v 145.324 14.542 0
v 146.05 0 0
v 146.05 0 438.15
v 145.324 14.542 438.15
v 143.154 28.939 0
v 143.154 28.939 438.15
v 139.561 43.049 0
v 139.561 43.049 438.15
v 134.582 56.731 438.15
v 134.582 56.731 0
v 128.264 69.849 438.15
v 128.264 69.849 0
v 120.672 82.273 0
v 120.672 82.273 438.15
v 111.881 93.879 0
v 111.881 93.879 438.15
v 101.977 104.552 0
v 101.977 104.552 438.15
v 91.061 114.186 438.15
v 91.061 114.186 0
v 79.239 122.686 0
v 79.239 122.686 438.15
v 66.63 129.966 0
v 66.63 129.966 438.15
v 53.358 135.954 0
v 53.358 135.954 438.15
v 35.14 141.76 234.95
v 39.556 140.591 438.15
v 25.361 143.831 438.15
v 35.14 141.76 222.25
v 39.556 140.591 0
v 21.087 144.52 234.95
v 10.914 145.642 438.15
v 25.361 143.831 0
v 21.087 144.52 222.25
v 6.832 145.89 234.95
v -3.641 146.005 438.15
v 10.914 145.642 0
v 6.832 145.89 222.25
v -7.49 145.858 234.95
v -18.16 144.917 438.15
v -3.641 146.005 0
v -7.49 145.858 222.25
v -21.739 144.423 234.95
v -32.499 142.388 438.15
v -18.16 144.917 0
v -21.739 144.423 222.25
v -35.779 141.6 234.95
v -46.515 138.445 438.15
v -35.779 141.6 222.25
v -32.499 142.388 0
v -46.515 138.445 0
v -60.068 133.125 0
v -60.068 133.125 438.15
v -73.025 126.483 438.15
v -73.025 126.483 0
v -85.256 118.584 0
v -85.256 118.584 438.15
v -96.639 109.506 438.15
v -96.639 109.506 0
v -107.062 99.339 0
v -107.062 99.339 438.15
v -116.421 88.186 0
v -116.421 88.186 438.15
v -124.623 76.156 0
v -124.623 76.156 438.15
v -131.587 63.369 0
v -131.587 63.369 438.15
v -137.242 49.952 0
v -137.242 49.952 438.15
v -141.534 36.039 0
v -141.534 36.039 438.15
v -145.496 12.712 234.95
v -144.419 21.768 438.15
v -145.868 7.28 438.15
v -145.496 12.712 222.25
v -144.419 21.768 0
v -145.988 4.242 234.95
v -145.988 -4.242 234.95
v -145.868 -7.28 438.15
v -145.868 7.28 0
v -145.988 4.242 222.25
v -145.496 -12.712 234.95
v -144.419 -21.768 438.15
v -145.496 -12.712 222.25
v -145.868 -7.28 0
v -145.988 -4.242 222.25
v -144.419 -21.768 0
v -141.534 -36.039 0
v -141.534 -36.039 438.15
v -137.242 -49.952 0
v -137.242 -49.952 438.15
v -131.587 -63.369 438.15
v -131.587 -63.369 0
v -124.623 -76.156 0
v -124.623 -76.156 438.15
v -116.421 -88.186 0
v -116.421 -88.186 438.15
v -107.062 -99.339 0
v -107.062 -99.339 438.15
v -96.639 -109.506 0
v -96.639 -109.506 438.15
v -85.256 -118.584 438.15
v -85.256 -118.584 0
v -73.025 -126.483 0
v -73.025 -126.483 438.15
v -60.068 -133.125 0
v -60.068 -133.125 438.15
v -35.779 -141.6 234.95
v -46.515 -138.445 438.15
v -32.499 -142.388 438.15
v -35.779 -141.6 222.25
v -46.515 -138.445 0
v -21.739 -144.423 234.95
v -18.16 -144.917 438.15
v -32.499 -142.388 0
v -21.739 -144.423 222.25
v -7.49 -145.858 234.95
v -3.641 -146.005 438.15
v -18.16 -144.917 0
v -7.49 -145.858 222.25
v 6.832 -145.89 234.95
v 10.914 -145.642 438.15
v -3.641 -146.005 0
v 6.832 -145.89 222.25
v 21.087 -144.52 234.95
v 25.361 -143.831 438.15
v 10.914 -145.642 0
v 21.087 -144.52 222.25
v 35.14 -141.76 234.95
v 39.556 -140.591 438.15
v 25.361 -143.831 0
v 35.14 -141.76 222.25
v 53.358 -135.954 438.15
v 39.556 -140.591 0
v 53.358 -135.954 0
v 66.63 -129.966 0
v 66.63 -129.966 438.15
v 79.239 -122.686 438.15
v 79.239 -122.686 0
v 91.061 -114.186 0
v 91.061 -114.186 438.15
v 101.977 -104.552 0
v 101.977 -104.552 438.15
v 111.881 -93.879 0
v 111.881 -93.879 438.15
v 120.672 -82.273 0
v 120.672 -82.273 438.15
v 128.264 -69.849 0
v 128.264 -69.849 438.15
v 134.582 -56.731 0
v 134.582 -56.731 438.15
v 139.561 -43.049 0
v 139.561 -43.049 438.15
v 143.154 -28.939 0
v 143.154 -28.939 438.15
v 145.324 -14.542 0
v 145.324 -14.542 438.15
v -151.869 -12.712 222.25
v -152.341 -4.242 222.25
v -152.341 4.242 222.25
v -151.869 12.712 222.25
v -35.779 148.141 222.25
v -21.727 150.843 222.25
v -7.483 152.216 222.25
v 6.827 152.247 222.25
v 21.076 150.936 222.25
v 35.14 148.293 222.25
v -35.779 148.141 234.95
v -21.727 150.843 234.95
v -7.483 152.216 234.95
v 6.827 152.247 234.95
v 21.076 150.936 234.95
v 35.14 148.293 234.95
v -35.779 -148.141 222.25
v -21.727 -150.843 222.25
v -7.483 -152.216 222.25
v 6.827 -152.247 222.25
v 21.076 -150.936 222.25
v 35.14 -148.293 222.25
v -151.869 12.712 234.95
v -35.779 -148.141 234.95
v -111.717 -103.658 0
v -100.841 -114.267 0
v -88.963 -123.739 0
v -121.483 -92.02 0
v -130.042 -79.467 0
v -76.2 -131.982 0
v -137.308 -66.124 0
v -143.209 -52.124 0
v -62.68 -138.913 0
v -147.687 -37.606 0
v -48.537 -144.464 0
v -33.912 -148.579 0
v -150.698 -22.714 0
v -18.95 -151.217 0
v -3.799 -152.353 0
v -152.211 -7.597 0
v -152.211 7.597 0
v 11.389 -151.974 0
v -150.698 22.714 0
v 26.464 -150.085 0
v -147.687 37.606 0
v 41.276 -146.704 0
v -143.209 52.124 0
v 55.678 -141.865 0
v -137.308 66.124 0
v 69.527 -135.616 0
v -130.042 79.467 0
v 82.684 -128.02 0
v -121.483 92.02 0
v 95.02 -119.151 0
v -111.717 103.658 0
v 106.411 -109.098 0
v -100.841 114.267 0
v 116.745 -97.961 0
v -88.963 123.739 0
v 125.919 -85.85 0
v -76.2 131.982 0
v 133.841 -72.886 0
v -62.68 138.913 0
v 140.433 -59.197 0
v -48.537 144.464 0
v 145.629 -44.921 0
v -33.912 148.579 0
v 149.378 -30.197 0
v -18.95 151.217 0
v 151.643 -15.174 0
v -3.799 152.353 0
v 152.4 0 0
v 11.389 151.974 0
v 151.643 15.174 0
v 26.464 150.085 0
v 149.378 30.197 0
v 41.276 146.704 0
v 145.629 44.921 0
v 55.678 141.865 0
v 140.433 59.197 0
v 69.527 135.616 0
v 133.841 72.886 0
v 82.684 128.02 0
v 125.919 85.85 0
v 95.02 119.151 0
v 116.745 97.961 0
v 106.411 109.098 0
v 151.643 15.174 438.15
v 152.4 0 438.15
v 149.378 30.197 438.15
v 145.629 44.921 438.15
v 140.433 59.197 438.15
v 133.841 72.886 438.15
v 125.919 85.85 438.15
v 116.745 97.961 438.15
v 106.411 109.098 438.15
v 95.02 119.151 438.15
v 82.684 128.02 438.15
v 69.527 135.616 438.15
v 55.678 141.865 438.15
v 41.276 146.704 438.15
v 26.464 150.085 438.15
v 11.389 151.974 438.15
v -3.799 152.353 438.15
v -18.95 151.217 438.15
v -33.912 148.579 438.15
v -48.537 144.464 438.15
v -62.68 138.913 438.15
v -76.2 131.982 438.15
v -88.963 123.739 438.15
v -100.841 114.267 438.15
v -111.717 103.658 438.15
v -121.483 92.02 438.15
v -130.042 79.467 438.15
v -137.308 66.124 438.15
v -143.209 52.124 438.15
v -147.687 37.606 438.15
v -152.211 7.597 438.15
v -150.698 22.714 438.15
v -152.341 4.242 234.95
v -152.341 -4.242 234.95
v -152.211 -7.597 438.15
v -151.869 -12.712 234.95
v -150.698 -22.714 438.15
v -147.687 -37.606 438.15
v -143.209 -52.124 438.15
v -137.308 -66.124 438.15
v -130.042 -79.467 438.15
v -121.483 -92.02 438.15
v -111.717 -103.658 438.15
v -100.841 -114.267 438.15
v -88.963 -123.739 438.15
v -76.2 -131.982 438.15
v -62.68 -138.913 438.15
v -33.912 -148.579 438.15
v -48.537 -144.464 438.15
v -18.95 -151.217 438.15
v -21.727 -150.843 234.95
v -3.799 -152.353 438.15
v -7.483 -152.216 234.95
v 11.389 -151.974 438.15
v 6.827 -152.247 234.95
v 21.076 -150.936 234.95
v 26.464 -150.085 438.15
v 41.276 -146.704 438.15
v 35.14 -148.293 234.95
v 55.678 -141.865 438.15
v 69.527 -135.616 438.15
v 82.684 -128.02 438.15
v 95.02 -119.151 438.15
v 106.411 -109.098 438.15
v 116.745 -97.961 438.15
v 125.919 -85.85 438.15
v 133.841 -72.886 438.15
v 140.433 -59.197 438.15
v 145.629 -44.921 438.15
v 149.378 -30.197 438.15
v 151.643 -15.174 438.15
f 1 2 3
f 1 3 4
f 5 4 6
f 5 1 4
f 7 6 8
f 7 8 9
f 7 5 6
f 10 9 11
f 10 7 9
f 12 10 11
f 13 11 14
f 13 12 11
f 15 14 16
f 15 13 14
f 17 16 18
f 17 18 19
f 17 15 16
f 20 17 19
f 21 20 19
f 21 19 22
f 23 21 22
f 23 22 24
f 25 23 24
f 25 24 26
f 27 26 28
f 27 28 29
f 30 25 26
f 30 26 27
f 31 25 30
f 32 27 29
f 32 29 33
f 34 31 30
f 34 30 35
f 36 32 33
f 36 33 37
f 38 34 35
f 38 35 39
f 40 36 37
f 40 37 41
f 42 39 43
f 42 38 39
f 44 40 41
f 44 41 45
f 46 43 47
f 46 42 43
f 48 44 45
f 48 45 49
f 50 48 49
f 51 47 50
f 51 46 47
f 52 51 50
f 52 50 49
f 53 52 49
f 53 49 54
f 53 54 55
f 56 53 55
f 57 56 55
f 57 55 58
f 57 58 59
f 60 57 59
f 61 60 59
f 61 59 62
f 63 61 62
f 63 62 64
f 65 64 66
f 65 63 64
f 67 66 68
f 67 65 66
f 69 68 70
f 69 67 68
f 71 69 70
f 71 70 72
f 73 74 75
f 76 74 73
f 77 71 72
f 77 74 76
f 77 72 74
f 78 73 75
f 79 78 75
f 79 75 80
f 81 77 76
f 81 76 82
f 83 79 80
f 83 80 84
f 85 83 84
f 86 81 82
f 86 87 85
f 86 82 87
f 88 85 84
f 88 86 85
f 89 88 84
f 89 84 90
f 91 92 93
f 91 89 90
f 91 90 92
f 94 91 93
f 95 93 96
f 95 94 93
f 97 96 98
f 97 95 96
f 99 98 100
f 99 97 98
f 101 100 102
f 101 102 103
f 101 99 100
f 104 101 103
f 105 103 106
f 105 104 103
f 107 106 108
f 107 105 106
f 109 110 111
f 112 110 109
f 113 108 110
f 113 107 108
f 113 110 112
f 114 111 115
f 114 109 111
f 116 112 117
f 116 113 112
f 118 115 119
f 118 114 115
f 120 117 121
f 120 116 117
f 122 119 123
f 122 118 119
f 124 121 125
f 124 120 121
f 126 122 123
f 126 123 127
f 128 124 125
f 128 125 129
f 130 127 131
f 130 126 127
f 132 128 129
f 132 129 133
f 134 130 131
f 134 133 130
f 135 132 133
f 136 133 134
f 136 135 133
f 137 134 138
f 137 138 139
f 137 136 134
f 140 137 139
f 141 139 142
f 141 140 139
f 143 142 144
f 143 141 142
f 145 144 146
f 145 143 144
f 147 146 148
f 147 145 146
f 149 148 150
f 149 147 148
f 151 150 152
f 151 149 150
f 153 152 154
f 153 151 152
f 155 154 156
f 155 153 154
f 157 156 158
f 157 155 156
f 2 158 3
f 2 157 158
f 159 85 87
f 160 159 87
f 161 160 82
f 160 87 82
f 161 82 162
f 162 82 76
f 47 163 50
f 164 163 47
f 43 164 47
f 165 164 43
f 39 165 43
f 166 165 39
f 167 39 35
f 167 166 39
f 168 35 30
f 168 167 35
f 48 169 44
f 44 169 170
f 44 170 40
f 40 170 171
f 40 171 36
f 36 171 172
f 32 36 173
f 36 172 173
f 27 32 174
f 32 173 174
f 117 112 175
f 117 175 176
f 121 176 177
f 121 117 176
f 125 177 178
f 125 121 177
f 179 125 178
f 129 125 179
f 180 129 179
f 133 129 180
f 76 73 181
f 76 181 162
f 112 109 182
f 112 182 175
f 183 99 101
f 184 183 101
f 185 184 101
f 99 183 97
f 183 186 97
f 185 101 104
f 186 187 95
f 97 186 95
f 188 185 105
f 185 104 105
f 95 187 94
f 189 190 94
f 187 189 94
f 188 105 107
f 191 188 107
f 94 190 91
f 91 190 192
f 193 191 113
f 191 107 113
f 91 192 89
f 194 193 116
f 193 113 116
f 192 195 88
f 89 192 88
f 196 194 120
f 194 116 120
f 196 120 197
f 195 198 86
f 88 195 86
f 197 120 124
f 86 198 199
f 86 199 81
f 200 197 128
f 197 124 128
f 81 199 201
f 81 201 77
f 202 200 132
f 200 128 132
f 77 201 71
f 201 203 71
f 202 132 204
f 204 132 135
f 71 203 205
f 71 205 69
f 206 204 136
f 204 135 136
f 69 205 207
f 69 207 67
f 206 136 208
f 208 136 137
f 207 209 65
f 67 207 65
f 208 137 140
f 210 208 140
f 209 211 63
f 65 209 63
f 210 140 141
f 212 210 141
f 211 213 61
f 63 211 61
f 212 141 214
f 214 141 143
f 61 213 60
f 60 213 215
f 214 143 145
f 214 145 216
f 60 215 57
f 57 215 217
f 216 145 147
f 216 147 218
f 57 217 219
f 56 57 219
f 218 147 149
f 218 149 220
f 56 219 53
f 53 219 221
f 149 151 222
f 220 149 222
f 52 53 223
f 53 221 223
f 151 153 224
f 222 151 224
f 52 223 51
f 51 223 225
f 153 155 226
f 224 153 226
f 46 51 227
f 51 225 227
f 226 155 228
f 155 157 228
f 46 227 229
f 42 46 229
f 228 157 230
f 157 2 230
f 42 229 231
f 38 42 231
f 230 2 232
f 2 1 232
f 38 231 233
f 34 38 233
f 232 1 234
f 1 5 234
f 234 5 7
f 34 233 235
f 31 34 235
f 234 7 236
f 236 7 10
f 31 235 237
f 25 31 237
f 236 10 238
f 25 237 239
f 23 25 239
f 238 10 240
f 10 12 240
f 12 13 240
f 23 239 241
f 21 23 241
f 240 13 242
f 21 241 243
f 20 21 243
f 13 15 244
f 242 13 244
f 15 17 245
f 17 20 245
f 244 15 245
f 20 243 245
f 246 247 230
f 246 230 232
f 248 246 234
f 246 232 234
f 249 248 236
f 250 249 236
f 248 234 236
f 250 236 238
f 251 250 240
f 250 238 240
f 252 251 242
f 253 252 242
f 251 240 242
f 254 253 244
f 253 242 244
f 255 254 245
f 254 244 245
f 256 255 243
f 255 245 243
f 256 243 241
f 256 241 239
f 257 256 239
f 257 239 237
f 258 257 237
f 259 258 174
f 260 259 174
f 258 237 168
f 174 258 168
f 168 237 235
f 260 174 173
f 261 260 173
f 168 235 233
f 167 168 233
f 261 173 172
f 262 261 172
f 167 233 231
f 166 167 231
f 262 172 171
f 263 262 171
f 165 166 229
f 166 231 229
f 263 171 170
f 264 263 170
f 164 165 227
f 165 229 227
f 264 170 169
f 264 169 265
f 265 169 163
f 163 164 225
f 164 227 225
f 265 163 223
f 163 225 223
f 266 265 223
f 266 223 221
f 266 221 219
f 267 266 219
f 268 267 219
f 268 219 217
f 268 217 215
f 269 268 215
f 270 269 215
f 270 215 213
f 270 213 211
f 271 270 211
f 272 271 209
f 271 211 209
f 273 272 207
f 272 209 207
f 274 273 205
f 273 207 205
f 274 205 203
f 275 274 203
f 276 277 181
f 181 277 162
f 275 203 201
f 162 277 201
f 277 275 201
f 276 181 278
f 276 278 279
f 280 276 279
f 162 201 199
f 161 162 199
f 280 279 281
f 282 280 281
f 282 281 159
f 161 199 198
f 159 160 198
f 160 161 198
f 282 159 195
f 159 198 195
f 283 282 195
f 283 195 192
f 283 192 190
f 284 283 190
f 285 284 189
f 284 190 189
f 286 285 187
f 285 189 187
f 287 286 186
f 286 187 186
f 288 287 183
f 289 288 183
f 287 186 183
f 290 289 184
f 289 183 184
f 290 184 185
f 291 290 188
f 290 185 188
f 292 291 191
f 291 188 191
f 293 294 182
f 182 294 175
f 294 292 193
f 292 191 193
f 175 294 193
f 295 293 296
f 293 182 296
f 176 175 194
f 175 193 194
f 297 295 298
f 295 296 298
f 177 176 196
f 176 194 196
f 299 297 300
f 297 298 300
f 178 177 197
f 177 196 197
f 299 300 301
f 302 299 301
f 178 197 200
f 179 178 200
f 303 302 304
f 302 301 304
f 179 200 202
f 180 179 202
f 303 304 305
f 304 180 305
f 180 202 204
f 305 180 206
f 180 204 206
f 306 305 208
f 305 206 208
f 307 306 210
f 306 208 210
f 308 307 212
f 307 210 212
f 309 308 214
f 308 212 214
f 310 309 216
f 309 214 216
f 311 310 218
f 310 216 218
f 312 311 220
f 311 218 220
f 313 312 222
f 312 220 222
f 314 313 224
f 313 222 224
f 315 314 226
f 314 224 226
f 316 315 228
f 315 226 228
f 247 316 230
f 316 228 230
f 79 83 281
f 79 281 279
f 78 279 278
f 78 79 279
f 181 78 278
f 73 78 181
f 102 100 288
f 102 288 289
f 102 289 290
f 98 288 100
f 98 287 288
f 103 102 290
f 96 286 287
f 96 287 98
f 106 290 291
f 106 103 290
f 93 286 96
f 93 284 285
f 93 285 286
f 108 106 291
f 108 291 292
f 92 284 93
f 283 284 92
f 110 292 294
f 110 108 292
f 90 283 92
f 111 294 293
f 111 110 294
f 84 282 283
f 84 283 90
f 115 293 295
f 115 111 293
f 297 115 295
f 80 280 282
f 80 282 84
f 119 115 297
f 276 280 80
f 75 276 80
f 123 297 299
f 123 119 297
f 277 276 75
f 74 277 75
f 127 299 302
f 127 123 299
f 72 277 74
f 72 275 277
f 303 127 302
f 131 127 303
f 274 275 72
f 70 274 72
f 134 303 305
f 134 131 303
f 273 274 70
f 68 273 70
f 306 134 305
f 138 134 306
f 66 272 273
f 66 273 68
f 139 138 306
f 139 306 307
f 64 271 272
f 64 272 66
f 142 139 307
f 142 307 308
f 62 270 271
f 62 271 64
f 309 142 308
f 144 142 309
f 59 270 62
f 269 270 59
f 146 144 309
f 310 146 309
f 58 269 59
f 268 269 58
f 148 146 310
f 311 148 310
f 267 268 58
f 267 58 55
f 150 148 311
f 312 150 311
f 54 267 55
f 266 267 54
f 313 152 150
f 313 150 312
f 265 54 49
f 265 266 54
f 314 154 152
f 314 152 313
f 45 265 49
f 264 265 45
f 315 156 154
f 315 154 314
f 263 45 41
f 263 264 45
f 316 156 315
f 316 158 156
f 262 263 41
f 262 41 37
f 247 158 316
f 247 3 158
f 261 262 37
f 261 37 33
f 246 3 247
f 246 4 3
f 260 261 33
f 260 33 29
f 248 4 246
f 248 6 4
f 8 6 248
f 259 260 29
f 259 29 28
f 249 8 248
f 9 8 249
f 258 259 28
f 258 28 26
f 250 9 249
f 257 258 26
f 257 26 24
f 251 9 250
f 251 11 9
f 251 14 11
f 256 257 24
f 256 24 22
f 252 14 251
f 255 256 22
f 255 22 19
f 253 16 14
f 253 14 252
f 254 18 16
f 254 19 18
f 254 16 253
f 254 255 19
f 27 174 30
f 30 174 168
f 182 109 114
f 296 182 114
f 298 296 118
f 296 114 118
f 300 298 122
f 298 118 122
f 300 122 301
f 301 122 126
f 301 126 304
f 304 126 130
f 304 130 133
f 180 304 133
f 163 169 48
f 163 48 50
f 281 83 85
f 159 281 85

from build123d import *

# Parameters (mm, degrees)
SKETCH1_R           = 152.4
SKETCH1_R_2         = 146.05
BOSS_EXTRUDE1_DEPTH = 438.15
SKETCH2_W           = 70.919063033
SKETCH2_H           = 12.7
CUT_EXTRUDE1_DEPTH  = 400.05
SKETCH3_W           = 12.7
SKETCH3_H           = 25.42329985
CUT_EXTRUDE2_DEPTH  = 508


with BuildPart() as part:
    # Sketch1 → Boss-Extrude1 (new body)
    with BuildSketch(Plane.XY):
        Circle(SKETCH1_R)
        Circle(SKETCH1_R_2, mode=Mode.SUBTRACT)
    extrude(amount=BOSS_EXTRUDE1_DEPTH)

    # Sketch2 → Cut-Extrude1 (cut, symmetric)
    with BuildSketch(Plane(origin=(0, 0, 0), x_dir=(1, 0, 0), z_dir=(0, 1, 0))):
        with Locations((-0.319607005, -228.6)):
            Rectangle(SKETCH2_W, SKETCH2_H)
    extrude(amount=CUT_EXTRUDE1_DEPTH, both=True, mode=Mode.SUBTRACT)

    # Sketch3 → Cut-Extrude2 (cut)
    with BuildSketch(Plane(origin=(0, 0, 0), x_dir=(0, 0, -1), z_dir=(1, 0, 0))):
        with Locations((-228.6, 0)):
            Rectangle(SKETCH3_W, SKETCH3_H)
    extrude(amount=-CUT_EXTRUDE2_DEPTH, mode=Mode.SUBTRACT)


solid = part.part
